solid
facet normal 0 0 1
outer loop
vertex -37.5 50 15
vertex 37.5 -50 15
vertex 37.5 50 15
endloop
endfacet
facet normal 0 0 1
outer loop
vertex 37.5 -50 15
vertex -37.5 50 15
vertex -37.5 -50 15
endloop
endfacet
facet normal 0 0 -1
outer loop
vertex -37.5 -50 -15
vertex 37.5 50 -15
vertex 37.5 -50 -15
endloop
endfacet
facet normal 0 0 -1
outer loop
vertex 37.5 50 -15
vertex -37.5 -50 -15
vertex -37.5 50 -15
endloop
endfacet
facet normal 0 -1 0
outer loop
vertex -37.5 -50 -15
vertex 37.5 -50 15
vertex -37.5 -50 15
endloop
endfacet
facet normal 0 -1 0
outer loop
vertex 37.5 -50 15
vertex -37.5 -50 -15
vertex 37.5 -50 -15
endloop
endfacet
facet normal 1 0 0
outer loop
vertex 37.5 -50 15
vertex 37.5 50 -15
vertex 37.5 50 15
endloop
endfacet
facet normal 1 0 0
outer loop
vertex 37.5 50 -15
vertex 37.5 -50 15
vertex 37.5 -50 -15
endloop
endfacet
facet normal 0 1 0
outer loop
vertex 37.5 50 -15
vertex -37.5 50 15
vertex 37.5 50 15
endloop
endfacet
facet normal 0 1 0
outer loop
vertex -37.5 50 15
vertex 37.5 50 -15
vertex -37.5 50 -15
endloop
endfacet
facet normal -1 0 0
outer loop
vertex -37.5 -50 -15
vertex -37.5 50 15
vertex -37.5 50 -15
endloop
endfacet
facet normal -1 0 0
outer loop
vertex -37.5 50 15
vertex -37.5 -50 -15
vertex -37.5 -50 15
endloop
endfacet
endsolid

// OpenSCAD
// ========================================
// a 75 x 100 x 30 mm box
// NeuroCAD canonical IR; dimensions are millimetres
// ========================================
$fn = 48;

cube(size=[75, 100, 30], center=true);
